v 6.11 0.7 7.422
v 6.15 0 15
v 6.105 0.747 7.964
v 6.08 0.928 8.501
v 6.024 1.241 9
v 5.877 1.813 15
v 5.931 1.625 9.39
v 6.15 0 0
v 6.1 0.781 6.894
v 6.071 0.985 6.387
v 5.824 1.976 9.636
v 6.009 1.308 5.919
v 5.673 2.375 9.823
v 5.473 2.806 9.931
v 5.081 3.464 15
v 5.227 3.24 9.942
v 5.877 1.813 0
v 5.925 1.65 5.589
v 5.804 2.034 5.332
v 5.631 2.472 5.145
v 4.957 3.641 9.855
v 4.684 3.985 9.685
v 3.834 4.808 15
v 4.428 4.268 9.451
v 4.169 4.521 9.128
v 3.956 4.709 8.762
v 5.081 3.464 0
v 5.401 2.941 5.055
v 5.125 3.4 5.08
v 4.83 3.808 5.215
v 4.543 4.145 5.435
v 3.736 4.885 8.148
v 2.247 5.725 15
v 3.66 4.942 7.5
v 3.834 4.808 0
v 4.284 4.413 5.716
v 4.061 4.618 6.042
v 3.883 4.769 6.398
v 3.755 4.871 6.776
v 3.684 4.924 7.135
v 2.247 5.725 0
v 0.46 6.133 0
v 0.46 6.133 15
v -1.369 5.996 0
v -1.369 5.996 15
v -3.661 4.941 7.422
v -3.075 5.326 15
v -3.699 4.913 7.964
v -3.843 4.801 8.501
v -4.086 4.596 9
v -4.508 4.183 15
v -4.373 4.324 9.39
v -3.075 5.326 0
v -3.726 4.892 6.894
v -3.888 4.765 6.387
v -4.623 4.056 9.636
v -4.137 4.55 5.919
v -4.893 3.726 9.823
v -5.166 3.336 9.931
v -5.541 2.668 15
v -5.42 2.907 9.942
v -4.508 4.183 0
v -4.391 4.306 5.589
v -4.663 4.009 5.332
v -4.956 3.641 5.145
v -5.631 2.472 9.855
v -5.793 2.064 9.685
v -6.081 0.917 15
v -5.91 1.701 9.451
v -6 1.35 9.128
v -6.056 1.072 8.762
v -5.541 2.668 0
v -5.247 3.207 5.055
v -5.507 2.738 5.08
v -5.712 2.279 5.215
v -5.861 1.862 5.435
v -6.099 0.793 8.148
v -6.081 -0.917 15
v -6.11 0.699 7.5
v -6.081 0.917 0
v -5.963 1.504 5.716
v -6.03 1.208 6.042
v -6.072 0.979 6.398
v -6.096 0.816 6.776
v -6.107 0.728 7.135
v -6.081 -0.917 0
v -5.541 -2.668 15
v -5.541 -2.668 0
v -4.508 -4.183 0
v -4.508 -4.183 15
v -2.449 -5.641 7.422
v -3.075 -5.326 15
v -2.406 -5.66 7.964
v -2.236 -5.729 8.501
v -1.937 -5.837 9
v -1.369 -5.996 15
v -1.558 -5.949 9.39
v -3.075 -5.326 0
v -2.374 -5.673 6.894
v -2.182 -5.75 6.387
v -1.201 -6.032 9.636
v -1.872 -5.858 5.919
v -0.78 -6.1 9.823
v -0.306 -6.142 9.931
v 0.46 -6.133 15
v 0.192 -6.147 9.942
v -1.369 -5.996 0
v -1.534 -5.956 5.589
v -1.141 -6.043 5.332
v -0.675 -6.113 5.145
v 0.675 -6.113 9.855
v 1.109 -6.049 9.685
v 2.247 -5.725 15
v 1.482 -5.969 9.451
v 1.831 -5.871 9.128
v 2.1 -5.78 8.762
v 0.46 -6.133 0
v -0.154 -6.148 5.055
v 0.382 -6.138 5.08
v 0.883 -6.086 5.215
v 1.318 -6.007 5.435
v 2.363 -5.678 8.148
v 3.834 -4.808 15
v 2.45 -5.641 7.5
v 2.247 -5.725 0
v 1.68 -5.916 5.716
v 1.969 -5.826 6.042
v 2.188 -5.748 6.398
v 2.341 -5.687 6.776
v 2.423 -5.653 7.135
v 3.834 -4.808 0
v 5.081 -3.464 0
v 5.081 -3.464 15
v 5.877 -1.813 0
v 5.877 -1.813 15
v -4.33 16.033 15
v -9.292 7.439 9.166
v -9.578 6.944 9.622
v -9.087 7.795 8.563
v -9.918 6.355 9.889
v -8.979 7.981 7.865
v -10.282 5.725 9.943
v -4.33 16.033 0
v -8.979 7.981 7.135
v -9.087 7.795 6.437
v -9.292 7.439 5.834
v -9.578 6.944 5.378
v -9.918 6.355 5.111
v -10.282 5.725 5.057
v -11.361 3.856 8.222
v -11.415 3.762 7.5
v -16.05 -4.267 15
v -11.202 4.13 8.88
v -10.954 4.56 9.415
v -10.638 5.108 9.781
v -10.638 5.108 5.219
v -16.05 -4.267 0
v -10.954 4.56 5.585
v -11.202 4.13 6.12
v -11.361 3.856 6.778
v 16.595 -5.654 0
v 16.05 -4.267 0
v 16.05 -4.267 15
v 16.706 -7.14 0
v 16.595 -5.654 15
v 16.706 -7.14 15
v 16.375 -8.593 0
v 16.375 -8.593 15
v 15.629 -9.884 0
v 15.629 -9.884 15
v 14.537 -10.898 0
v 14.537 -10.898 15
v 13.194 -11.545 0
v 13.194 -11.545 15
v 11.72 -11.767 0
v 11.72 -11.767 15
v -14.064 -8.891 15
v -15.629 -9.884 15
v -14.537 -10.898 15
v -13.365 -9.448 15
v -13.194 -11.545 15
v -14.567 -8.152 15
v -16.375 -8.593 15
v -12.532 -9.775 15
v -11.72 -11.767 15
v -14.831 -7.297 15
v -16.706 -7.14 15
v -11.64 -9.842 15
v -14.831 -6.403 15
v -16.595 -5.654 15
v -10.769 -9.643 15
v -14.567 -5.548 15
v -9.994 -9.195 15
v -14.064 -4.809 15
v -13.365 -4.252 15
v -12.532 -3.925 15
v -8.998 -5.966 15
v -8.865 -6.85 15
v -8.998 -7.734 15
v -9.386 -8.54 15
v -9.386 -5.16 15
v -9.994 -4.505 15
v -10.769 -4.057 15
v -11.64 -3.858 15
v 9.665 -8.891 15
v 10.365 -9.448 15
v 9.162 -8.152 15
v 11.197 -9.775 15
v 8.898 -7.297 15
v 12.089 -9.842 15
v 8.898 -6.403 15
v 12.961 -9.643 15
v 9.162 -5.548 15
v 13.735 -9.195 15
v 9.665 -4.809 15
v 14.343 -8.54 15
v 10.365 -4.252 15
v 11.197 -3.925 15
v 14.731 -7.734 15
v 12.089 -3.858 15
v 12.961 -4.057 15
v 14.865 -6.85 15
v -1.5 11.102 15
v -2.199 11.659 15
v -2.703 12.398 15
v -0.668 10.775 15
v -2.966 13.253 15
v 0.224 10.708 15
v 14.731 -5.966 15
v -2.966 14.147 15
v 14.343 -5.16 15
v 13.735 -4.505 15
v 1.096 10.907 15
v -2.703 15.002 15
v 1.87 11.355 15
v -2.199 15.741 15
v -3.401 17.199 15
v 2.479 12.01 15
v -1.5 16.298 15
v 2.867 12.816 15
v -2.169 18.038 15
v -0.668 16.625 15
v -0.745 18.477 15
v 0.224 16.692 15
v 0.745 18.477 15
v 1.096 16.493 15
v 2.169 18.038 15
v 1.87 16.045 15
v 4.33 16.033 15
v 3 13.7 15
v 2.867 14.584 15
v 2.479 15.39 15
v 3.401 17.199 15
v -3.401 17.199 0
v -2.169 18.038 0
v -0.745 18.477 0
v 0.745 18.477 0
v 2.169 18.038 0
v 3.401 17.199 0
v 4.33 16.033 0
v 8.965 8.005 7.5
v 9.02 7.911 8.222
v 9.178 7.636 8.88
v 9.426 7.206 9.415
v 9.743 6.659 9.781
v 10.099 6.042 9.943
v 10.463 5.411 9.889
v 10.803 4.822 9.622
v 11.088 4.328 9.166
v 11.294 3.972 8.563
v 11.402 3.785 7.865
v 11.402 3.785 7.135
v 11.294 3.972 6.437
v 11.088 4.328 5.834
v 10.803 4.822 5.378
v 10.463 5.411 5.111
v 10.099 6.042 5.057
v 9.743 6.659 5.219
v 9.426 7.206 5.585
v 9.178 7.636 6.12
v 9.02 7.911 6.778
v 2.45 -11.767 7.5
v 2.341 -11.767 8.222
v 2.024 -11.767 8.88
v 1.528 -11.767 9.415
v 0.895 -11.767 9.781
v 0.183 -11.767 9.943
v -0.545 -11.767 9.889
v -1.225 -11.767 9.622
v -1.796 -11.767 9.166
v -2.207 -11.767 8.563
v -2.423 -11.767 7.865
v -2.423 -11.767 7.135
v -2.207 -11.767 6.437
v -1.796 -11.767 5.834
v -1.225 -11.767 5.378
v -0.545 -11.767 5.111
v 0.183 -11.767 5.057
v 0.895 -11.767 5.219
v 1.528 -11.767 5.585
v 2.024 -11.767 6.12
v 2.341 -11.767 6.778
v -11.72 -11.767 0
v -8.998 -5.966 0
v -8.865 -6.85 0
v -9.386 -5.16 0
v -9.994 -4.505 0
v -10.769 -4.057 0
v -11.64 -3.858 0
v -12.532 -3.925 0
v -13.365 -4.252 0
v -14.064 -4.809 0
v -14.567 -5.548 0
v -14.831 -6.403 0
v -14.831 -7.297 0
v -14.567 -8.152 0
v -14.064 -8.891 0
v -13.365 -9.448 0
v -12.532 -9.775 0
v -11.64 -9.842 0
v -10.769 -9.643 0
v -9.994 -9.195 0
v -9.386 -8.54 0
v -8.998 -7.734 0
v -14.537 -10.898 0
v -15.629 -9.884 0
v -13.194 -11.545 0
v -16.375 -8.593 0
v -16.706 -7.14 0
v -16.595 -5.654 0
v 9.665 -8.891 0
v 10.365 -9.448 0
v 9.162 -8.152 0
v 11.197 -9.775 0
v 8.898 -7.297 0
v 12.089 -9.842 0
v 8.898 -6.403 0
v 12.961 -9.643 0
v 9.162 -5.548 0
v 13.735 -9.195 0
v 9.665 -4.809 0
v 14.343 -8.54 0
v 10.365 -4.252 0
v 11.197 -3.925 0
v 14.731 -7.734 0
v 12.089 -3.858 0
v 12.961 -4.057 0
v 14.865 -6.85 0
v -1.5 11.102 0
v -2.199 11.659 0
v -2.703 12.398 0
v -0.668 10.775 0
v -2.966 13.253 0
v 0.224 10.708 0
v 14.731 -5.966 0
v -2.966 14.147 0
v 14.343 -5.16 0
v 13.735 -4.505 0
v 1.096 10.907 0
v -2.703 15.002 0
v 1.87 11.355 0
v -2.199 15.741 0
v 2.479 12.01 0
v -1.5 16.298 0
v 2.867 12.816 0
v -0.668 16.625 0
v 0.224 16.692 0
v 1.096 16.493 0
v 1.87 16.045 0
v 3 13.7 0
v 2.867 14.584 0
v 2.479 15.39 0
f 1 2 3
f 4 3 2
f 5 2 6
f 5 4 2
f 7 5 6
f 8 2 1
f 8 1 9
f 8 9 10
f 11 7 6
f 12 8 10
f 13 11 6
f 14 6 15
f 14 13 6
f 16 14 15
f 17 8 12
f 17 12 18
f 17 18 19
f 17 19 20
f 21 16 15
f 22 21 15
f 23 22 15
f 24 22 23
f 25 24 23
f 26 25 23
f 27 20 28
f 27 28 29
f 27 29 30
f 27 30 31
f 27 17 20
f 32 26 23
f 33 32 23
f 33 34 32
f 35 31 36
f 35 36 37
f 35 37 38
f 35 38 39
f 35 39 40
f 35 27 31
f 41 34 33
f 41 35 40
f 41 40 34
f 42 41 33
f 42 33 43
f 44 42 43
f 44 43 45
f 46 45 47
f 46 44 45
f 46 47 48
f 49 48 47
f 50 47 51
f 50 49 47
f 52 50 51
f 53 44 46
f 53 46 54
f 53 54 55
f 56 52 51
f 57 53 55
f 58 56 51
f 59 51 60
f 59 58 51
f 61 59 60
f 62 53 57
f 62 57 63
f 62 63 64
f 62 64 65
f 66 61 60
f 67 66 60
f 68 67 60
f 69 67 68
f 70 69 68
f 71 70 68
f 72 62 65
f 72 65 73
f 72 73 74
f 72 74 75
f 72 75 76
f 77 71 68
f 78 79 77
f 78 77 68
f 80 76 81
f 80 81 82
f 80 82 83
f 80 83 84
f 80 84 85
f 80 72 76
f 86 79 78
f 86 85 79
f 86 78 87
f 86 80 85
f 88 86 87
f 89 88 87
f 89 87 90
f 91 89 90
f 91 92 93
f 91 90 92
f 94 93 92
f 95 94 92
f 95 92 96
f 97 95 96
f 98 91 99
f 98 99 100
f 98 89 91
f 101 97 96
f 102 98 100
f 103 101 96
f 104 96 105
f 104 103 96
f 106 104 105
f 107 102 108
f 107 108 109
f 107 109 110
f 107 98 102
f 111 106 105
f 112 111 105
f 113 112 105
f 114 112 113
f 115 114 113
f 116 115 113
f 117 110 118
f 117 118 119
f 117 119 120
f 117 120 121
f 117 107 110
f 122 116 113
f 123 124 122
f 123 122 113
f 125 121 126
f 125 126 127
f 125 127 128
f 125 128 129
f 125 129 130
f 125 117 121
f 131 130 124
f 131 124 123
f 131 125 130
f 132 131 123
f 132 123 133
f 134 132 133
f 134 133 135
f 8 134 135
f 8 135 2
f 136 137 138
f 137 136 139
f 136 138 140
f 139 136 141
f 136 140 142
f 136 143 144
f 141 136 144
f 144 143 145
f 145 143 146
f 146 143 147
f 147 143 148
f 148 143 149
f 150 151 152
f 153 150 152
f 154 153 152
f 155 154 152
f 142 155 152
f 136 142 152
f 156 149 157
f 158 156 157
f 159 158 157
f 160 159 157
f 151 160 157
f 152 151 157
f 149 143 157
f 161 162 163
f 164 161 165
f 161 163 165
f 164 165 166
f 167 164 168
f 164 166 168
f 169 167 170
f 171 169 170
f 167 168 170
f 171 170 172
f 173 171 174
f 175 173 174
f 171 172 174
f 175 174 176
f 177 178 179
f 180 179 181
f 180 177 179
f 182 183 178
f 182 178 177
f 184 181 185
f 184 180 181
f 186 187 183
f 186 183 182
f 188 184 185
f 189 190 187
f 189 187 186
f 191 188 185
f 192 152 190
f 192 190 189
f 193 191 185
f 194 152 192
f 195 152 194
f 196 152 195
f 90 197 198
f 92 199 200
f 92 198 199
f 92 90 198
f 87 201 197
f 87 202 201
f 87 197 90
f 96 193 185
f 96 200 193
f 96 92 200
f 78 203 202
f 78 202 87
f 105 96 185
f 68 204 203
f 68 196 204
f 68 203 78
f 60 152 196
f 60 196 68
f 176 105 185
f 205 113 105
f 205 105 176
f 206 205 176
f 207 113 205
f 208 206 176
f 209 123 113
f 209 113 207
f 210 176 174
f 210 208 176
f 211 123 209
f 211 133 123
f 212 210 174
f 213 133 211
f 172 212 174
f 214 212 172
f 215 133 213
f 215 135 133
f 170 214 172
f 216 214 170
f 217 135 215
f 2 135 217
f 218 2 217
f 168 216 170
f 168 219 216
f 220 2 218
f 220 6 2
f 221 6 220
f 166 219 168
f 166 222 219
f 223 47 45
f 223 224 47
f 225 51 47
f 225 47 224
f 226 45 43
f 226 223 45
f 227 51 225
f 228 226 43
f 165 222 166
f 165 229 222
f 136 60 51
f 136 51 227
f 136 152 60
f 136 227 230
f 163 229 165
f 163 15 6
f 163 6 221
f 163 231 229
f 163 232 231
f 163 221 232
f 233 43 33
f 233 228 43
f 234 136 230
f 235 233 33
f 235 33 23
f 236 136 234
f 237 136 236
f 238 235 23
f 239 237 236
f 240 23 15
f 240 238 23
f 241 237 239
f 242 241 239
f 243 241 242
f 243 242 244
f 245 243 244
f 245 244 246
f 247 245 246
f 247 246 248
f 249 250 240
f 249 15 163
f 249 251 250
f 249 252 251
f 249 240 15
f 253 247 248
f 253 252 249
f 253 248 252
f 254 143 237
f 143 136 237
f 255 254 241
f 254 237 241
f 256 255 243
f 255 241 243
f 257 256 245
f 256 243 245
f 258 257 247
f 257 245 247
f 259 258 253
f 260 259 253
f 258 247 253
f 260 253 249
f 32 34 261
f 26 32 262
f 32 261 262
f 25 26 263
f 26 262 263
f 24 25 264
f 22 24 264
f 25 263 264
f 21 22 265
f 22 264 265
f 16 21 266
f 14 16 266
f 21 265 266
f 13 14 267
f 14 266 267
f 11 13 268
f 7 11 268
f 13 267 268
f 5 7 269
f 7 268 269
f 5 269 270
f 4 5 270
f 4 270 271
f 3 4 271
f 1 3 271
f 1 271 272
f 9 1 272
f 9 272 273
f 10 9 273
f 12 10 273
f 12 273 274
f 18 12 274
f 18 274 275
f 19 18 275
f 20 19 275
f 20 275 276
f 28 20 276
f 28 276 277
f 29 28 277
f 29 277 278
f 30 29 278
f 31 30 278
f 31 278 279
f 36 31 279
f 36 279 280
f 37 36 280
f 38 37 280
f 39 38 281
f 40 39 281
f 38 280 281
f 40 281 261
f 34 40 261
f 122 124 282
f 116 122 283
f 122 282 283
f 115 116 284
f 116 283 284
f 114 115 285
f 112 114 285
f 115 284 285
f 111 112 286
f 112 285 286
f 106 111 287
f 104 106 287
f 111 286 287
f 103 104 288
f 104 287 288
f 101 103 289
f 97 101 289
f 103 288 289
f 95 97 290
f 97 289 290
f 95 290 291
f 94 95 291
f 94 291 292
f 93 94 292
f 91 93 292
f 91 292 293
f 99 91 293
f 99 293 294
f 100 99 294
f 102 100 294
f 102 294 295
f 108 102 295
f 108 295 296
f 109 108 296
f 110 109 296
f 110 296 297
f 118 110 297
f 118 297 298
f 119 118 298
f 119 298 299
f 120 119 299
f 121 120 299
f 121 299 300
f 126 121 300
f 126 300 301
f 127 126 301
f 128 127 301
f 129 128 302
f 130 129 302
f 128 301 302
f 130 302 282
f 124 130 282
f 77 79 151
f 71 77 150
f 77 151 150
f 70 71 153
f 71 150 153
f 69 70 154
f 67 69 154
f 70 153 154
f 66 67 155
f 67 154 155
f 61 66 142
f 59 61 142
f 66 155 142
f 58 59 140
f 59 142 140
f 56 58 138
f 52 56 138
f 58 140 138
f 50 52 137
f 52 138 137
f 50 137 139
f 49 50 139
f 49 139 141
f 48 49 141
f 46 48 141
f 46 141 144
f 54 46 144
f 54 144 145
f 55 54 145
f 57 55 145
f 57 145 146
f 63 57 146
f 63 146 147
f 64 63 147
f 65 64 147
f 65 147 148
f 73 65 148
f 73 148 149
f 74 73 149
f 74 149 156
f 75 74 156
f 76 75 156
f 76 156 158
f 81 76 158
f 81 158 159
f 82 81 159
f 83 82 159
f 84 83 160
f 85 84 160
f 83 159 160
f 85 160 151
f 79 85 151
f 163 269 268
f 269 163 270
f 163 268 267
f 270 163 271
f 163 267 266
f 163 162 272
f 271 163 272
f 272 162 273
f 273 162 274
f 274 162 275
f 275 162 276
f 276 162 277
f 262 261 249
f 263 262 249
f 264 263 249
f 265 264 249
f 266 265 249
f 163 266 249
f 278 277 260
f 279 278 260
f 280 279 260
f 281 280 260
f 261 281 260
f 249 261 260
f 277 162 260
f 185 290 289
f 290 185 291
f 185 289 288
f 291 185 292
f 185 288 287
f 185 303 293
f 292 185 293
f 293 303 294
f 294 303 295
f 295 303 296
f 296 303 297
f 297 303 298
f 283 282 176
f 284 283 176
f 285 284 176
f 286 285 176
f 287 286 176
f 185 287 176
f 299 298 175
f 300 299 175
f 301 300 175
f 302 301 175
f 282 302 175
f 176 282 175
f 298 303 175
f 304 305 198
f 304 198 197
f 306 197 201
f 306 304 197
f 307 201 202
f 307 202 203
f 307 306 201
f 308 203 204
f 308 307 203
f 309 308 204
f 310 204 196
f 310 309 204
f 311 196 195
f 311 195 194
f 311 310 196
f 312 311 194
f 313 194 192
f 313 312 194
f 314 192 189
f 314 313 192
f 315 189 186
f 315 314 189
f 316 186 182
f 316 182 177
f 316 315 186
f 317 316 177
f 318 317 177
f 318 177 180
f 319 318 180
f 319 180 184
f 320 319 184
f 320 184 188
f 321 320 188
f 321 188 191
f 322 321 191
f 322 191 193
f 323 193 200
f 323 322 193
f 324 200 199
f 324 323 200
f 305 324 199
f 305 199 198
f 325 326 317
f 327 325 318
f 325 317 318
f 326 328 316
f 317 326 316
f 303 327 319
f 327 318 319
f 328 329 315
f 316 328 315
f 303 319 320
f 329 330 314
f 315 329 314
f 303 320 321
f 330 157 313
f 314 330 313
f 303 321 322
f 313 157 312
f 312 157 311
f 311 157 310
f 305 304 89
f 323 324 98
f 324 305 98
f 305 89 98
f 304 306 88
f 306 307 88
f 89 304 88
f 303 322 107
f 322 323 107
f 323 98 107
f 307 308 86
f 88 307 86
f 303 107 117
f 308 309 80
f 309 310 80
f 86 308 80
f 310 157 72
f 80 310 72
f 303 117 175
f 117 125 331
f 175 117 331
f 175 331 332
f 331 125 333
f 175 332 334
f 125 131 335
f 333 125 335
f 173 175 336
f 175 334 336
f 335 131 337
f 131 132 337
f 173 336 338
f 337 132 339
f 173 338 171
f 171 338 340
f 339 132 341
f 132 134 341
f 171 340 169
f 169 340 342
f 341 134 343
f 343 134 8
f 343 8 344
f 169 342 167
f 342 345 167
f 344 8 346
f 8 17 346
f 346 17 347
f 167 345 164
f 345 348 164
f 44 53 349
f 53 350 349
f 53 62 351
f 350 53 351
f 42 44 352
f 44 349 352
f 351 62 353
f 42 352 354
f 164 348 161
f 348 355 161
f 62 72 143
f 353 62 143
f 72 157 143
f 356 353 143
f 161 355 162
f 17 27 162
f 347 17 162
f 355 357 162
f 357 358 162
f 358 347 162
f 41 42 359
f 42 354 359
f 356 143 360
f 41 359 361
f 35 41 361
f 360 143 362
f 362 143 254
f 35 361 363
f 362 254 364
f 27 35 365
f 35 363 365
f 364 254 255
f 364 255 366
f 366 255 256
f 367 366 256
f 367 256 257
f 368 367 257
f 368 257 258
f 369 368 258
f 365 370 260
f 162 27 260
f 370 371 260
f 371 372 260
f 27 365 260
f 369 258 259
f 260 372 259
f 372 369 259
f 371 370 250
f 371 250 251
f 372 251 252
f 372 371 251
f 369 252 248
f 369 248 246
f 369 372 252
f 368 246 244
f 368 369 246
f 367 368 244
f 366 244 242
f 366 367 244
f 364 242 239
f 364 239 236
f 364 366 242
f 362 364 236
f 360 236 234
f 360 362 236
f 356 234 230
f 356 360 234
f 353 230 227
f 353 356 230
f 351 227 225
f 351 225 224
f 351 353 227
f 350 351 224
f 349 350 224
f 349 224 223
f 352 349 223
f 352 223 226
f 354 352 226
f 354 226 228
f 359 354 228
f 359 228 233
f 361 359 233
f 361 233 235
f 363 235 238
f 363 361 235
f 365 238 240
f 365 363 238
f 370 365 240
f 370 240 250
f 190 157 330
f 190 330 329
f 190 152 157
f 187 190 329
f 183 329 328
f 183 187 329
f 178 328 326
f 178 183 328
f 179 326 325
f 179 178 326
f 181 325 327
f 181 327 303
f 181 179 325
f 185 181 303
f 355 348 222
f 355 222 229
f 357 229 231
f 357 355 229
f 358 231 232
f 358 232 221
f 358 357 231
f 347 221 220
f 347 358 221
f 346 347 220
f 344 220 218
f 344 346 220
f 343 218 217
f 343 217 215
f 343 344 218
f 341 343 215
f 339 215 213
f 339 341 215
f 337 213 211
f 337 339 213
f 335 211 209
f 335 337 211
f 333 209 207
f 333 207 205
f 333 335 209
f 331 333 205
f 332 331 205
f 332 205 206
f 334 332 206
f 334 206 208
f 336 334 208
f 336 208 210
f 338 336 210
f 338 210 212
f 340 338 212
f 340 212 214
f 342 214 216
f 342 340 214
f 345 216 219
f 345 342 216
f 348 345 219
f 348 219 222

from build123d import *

# Parameters (mm, degrees)
SKETCH_R           = 3
SKETCH_R_2         = 6.15
PAD_DEPTH          = 15
FILLET_R           = 5
SKETCH001_R        = 2.45
POCKET_DEPTH       = 11
POLARPATTERN_COUNT = 3


with BuildPart() as part:
    # Sketch → Pad (new body)
    with BuildSketch(Plane.XY):
        Polygon((0, 23.5333333333), (-20.3804645024, -11.7666666667), (20.3804645024, -11.7666666667), align=None)
        with Locations((0, 13.7)):
            Circle(SKETCH_R, mode=Mode.SUBTRACT)
        with Locations((11.8645480319, -6.85)):
            Circle(SKETCH_R, mode=Mode.SUBTRACT)
        with Locations((-11.8645480318, -6.85)):
            Circle(SKETCH_R, mode=Mode.SUBTRACT)
        Circle(SKETCH_R_2, mode=Mode.SUBTRACT)
    extrude(amount=PAD_DEPTH)

    # Fillet
    fillet_edges = [part.edges().sort_by_distance(p)[0] for p in [
        (-20.380465, -11.766667, 7.5),
        (0, 23.533333, 7.5),
        (20.380465, -11.766667, 7.5),
    ]]
    fillet(fillet_edges, radius=FILLET_R)

    # Sketch001 (on DatumPlane) → Pocket (cut)
    with BuildSketch(Plane(origin=(-10.1902322512, 5.8833333333, 0), x_dir=(-0.5, -0.8660254038, 0), z_dir=(-0.8660254038, 0.5, 0))):
        with Locations((0, 7.5)):
            Circle(SKETCH001_R)
    pocket = extrude(amount=-POCKET_DEPTH, mode=Mode.SUBTRACT)

    # PolarPattern: Pocket ×3 about axis
    polarpattern_axis = Axis((0, 0, 0), (0, 0, 1))
    for i in range(1, POLARPATTERN_COUNT):
        add(pocket.rotate(polarpattern_axis, i * 360 / POLARPATTERN_COUNT), mode=Mode.SUBTRACT)


solid = part.part
